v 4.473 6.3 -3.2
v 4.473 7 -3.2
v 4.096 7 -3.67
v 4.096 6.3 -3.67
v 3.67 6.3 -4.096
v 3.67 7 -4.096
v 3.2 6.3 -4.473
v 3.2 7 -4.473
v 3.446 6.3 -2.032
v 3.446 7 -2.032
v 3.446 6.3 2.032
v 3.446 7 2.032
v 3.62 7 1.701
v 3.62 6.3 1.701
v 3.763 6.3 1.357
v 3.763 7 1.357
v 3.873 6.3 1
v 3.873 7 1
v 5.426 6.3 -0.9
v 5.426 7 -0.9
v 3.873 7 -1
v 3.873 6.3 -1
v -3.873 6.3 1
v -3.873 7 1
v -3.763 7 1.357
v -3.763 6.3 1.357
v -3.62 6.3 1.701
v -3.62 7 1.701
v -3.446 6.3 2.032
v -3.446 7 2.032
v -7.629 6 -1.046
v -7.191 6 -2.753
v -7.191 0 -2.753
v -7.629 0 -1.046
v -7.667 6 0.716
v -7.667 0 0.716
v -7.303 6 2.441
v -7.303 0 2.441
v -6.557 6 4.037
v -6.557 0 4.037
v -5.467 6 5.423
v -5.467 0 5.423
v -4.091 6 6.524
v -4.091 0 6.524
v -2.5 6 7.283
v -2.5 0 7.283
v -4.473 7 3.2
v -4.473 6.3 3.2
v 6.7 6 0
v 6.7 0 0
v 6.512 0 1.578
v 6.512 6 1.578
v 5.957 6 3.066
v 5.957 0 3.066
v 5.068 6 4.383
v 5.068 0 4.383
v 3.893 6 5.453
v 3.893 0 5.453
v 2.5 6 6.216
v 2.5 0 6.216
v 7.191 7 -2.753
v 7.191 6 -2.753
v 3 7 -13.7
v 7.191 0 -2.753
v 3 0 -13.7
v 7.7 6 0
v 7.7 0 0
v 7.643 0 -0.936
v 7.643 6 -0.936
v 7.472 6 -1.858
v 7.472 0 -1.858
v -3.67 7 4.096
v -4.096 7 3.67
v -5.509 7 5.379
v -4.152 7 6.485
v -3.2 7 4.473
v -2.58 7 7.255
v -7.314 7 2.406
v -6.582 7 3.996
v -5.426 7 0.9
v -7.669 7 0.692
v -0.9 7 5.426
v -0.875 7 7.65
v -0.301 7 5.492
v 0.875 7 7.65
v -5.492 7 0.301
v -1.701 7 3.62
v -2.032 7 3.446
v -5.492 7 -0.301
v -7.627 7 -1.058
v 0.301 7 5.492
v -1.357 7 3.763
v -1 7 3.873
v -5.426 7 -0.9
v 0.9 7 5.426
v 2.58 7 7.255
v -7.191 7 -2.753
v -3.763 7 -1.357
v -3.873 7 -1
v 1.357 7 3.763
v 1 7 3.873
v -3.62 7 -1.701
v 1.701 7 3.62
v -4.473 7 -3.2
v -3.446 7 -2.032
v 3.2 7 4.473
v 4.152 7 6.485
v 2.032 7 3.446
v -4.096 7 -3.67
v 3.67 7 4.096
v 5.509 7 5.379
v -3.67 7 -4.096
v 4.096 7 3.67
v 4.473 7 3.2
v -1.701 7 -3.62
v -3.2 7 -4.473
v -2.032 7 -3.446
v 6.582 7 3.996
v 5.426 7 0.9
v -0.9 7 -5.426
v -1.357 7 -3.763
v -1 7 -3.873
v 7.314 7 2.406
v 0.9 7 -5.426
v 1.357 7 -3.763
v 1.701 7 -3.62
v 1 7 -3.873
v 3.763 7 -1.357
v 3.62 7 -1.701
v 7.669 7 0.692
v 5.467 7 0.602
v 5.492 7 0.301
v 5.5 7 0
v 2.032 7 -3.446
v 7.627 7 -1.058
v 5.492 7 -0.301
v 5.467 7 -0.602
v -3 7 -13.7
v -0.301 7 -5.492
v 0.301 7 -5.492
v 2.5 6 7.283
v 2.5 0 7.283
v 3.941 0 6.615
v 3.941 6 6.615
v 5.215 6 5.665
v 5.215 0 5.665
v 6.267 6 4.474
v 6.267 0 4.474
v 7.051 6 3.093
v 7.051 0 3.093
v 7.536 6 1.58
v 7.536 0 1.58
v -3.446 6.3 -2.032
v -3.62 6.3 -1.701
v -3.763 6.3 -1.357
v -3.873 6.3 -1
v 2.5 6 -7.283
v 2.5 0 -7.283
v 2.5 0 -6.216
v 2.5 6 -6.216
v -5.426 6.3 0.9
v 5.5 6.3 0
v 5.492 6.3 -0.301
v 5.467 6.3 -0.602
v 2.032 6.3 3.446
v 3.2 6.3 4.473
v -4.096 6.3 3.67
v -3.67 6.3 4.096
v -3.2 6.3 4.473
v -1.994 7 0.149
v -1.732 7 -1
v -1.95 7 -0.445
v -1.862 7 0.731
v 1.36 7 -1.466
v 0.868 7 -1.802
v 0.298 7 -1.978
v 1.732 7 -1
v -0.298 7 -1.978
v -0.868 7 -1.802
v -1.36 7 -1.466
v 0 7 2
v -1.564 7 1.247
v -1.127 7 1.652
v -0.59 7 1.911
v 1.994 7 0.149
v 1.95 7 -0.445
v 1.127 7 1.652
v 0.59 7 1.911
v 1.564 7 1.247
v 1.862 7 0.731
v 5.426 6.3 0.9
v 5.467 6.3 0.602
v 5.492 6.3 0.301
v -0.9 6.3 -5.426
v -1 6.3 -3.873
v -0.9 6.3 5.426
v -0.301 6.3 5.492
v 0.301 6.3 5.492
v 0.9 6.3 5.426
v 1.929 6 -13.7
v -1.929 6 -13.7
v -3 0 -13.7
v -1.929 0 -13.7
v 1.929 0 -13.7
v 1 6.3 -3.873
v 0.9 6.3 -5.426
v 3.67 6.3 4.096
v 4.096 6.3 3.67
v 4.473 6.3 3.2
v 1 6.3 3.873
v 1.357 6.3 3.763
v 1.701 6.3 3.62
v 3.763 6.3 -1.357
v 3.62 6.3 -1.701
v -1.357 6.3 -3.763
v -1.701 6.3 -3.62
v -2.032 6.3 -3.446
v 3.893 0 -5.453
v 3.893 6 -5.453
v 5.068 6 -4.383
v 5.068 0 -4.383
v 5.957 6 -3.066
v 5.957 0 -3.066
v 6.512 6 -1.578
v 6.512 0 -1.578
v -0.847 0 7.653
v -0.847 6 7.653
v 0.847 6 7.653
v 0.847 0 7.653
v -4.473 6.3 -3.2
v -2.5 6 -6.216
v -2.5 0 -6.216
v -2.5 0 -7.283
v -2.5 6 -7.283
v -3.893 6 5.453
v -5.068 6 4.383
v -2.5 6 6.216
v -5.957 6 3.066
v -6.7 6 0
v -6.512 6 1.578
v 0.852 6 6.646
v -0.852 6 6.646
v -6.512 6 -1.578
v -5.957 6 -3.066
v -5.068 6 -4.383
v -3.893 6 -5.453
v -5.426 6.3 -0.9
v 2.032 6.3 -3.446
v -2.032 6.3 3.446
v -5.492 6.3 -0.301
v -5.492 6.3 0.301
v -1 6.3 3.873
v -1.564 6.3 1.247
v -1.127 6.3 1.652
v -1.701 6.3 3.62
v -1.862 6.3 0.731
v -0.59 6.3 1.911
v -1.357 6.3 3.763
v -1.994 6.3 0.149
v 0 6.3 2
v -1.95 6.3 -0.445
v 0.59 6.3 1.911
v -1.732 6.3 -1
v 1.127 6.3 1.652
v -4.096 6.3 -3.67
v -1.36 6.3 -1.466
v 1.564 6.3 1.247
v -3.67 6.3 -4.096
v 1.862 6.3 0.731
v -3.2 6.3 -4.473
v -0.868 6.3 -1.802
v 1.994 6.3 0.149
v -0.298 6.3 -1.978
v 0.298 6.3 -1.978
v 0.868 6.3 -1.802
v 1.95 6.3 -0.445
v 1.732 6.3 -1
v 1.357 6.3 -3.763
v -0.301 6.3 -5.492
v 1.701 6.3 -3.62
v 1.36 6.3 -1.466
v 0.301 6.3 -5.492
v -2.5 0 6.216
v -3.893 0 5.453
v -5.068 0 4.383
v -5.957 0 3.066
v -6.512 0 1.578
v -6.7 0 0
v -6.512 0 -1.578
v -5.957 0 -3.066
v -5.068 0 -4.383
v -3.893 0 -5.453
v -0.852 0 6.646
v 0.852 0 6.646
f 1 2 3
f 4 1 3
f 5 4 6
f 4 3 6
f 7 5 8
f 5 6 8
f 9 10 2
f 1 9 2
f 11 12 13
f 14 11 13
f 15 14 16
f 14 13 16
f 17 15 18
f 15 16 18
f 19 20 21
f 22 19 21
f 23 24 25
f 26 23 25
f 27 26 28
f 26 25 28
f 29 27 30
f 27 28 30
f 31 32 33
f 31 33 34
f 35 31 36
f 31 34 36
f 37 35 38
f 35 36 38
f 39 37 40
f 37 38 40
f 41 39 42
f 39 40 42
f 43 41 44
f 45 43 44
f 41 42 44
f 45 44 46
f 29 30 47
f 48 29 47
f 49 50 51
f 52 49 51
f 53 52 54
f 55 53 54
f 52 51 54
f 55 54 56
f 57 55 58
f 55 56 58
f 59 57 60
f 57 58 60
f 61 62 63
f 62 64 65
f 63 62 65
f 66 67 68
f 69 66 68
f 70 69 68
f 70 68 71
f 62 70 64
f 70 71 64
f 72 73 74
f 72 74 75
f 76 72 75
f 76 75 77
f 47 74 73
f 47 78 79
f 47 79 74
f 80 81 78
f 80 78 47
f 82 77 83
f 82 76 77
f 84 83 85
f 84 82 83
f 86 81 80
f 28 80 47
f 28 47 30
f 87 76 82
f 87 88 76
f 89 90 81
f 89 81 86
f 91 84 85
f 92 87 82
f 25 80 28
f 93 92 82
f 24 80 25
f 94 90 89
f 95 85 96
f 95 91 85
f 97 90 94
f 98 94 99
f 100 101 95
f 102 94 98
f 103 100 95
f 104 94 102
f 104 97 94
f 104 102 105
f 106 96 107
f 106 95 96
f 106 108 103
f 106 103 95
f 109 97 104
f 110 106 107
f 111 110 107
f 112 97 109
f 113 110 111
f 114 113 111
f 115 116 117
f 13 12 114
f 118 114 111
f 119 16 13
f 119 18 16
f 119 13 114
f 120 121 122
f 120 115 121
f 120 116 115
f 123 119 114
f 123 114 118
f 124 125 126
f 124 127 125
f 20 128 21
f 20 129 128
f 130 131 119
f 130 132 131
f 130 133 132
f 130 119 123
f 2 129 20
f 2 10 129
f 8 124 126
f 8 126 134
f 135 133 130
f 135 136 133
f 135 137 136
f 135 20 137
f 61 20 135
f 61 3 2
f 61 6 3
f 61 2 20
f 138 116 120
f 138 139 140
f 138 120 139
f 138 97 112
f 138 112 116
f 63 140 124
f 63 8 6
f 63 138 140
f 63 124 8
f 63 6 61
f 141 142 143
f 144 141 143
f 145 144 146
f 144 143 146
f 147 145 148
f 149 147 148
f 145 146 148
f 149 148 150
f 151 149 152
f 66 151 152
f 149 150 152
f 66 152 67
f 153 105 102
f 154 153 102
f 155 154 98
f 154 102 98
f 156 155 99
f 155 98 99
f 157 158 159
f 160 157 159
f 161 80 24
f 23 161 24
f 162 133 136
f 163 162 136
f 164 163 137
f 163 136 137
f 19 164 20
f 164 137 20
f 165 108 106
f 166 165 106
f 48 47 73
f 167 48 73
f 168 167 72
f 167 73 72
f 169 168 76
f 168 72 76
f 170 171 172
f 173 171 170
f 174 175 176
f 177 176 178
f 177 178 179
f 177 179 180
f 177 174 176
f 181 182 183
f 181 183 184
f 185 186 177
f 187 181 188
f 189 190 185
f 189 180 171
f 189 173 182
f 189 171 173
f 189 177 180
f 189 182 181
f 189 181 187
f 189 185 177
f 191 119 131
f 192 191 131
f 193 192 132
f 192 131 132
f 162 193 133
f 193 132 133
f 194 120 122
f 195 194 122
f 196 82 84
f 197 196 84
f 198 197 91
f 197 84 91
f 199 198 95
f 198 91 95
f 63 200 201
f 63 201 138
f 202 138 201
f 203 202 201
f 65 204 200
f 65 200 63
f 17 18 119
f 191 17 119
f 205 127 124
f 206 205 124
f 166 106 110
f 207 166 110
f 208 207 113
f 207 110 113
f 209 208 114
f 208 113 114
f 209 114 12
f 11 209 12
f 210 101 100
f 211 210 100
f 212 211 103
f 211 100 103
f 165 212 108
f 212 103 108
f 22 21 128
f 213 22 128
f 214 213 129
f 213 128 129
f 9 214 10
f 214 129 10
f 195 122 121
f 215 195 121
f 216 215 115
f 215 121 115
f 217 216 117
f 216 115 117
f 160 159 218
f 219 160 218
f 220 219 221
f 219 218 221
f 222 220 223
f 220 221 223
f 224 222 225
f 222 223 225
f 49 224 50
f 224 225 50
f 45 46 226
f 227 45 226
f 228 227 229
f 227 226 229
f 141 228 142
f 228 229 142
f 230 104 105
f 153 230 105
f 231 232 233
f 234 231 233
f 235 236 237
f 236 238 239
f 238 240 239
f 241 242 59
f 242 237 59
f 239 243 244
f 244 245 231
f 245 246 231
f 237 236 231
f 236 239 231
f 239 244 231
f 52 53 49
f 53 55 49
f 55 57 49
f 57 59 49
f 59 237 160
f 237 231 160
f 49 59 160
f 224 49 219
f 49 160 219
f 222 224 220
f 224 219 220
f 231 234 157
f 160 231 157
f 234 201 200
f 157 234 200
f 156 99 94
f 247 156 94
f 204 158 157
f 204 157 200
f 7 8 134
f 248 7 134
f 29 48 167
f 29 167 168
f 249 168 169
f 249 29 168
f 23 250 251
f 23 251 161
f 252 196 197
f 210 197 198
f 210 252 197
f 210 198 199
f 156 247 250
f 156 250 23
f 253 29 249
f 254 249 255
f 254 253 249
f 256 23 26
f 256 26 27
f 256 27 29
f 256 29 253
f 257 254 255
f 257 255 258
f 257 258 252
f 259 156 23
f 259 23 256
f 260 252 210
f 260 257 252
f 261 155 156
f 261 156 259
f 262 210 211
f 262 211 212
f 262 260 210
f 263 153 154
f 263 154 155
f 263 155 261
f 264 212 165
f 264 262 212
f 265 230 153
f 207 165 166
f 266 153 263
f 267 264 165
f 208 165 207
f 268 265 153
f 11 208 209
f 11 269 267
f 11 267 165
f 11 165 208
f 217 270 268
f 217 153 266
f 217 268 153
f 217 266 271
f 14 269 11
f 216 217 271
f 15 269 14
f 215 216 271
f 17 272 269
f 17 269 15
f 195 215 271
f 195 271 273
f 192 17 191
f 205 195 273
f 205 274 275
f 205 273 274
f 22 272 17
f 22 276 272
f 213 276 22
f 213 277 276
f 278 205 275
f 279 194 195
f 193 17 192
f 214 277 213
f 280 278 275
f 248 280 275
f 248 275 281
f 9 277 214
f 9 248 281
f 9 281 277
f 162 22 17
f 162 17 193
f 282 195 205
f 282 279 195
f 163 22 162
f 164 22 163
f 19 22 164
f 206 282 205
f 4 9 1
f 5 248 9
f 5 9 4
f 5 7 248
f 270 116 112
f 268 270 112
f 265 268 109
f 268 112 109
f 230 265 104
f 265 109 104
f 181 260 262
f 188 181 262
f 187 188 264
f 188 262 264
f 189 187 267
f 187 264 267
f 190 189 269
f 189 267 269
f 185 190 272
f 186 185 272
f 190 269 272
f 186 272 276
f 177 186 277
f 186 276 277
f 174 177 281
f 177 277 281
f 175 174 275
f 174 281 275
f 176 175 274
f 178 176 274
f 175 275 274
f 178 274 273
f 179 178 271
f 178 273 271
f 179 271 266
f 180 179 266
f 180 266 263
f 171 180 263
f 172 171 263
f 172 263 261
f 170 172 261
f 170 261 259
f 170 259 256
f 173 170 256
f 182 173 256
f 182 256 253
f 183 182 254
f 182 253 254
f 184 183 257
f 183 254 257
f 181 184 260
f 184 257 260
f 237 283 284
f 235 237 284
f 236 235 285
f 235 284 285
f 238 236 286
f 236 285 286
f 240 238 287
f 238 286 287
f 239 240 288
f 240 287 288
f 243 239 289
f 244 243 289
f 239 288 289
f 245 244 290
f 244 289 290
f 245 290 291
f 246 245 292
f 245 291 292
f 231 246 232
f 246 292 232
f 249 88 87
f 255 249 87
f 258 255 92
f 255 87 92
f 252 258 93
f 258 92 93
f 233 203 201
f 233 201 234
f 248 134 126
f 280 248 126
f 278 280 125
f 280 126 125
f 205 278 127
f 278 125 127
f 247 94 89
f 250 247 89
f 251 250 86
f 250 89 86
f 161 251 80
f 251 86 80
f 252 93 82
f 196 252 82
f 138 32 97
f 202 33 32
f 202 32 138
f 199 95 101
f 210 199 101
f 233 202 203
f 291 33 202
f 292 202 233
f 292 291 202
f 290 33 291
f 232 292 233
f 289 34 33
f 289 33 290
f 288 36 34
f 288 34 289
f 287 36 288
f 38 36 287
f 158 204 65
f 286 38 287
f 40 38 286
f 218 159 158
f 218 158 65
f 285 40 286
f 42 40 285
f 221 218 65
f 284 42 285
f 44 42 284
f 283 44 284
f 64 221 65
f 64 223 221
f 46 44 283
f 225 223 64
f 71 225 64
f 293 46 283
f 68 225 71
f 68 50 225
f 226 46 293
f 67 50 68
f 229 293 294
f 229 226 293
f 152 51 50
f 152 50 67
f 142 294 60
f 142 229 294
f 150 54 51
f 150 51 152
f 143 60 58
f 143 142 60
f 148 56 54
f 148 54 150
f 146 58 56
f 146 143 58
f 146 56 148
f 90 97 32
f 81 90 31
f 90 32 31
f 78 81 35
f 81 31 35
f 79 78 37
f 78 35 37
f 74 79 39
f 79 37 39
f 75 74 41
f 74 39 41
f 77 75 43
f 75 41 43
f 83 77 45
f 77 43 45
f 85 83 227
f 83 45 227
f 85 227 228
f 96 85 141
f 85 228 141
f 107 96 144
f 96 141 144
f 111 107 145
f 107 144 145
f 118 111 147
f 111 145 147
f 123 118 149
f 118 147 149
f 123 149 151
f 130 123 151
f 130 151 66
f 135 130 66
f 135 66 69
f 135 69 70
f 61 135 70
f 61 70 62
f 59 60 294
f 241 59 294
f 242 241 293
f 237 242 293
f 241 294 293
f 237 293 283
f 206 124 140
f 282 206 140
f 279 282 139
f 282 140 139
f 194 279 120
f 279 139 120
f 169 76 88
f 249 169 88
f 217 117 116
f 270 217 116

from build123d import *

# Parameters (mm, degrees)
BOSS_EXTRUDE1_DEPTH = 6
BOSS_EXTRUDE2_DEPTH = 1
BOSS_EXTRUDE3_START = 6
BOSS_EXTRUDE3_DEPTH = 6
SKETCH4_R           = 4
CUT_EXTRUDE1_DEPTH  = 0.7
SKETCH5_R           = 2
BOSS_EXTRUDE4_DEPTH = 0.7


with BuildPart() as part:
    # Sketch1 → Boss-Extrude1 (new body)
    with BuildSketch(Plane(origin=(0, 0, 0), x_dir=(1, 0, 0), z_dir=(0, 1, 0))):
        with BuildLine():
            ThreePointArc((-2.5, 7.282856582), (-7.7, 0), (-2.5, -7.282856582))
            Line((-2.5, -7.282856582), (-2.5, -6.216108107))
            ThreePointArc((-2.5, -6.216108107), (-6.7, 0), (-2.5, 6.216108107))
            Line((-2.5, 6.216108107), (-2.5, 7.282856582))
        make_face()
        with BuildLine():
            Line((-2.5, -6.216108107), (-2.5, -7.282856582))
            ThreePointArc((-2.5, -7.282856582), (0, -7.7), (2.5, -7.282856582))
            Line((2.5, -7.282856582), (2.5, -6.216108107))
            ThreePointArc((2.5, -6.216108107), (0, -6.7), (-2.5, -6.216108107))
        make_face()
        with BuildLine():
            Line((2.5, -6.216108107), (2.5, -7.282856582))
            ThreePointArc((2.5, -7.282856582), (6.266578014, -4.474371464), (7.7, 0))
            ThreePointArc((7.7, 0), (6.266578014, 4.474371464), (2.5, 7.282856582))
            Line((2.5, 7.282856582), (2.5, 6.216108107))
            ThreePointArc((2.5, 6.216108107), (5.551576353, 3.750999867), (6.7, 0))
            ThreePointArc((6.7, 0), (5.551576353, -3.750999867), (2.5, -6.216108107))
        make_face()
    extrude(amount=BOSS_EXTRUDE1_DEPTH)

    # Sketch2 → Boss-Extrude2 (add)
    with BuildSketch(Plane(origin=(0, 6, 0), x_dir=(1, 0, 0), z_dir=(0, 1, 0))):
        with BuildLine():
            Line((3, 13.7), (-3, 13.7))
            Line((-3, 13.7), (-7.191011254, 2.753063229))
            ThreePointArc((-7.191011254, 2.753063229), (-5.348708418, 5.539071968), (-2.5, 7.282856582))
            ThreePointArc((-2.5, 7.282856582), (0, 7.7), (2.5, 7.282856582))
            ThreePointArc((2.5, 7.282856582), (5.348708418, 5.539071968), (7.191011254, 2.753063229))
            Line((7.191011254, 2.753063229), (3, 13.7))
        make_face()
        with BuildLine():
            ThreePointArc((2.5, 6.216108107), (0, -6.7), (-2.5, 6.216108107))
            Line((-2.5, 6.216108107), (-2.5, 7.282856582))
            ThreePointArc((-2.5, 7.282856582), (0, -7.7), (2.5, 7.282856582))
            Line((2.5, 7.282856582), (2.5, 6.216108107))
        make_face()
        with BuildLine():
            ThreePointArc((-2.5, 7.282856582), (-5.348708418, 5.539071968), (-7.191011254, 2.753063229))
            ThreePointArc((-7.191011254, 2.753063229), (-1.399859519, -7.571683652), (7.7, 0))
            ThreePointArc((7.7, 0), (7.571683652, 1.399859519), (7.191011254, 2.753063229))
            ThreePointArc((7.191011254, 2.753063229), (5.348708418, 5.539071968), (2.5, 7.282856582))
            Line((2.5, 7.282856582), (2.5, 6.216108107))
            ThreePointArc((2.5, 6.216108107), (0, -6.7), (-2.5, 6.216108107))
            Line((-2.5, 6.216108107), (-2.5, 7.282856582))
        make_face()
        with BuildLine():
            ThreePointArc((2.5, 7.282856582), (0, 7.7), (-2.5, 7.282856582))
            Line((-2.5, 7.282856582), (-2.5, 6.216108107))
            ThreePointArc((-2.5, 6.216108107), (0, -6.7), (2.5, 6.216108107))
            Line((2.5, 6.216108107), (2.5, 7.282856582))
        make_face()
    extrude(amount=BOSS_EXTRUDE2_DEPTH)

    # Sketch3 → Boss-Extrude3 (add)
    with BuildSketch(Plane.XZ.offset(-6).offset(BOSS_EXTRUDE3_START)):
        with BuildLine():
            Line((-7.191011254, -2.753063229), (-3, -13.7))
            Line((-3, -13.7), (-1.929218753, -13.7))
            Line((-1.929218753, -13.7), (-2.5, -7.282856582))
            ThreePointArc((-2.5, -7.282856582), (-5.348708418, -5.539071968), (-7.191011254, -2.753063229))
        make_face()
        with BuildLine():
            Line((2.5, -7.282856582), (1.929218753, -13.7))
            Line((1.929218753, -13.7), (3, -13.7))
            Line((3, -13.7), (7.191011254, -2.753063229))
            ThreePointArc((7.191011254, -2.753063229), (5.348708418, -5.539071968), (2.5, -7.282856582))
        make_face()
    extrude(amount=-BOSS_EXTRUDE3_DEPTH)

    # Sketch4 → Cut-Extrude1 (cut)
    with BuildSketch(Plane(origin=(0, 7, 0), x_dir=(1, 0, 0), z_dir=(0, 1, 0))):
        Circle(SKETCH4_R)
        with BuildLine():
            Line((-2.031506006, 3.445719569), (-3.200269116, 4.473061322))
            ThreePointArc((-3.200269116, 4.473061322), (-3.889087297, 3.889087297), (-4.473061322, 3.200269116))
            Line((-4.473061322, 3.200269116), (-3.445719569, 2.031506006))
            ThreePointArc((-3.445719569, 2.031506006), (-2.828427125, 2.828427125), (-2.031506006, 3.445719569))
        make_face()
        with BuildLine():
            Line((-3.872983346, 1), (-5.425863987, 0.9))
            ThreePointArc((-5.425863987, 0.9), (-5.5, 0), (-5.425863987, -0.9))
            Line((-5.425863987, -0.9), (-3.872983346, -1))
            ThreePointArc((-3.872983346, -1), (-4, 0), (-3.872983346, 1))
        make_face()
        with BuildLine():
            Line((-3.445719569, -2.031506006), (-4.473061322, -3.200269116))
            ThreePointArc((-4.473061322, -3.200269116), (-3.889087297, -3.889087297), (-3.200269116, -4.473061322))
            Line((-3.200269116, -4.473061322), (-2.031506006, -3.445719569))
            ThreePointArc((-2.031506006, -3.445719569), (-2.828427125, -2.828427125), (-3.445719569, -2.031506006))
        make_face()
        with BuildLine():
            Line((-1, -3.872983346), (-0.9, -5.425863987))
            ThreePointArc((-0.9, -5.425863987), (0, -5.5), (0.9, -5.425863987))
            Line((0.9, -5.425863987), (1, -3.872983346))
            ThreePointArc((1, -3.872983346), (0, -4), (-1, -3.872983346))
        make_face()
        with BuildLine():
            ThreePointArc((3.200269116, -4.473061322), (3.889087297, -3.889087297), (4.473061322, -3.200269116))
            Line((4.473061322, -3.200269116), (3.445719569, -2.031506006))
            ThreePointArc((3.445719569, -2.031506006), (2.828427125, -2.828427125), (2.031506006, -3.445719569))
            Line((2.031506006, -3.445719569), (3.200269116, -4.473061322))
        make_face()
        with BuildLine():
            ThreePointArc((5.5, 0), (5.481434663, 0.451524127), (5.425863987, 0.9))
            Line((5.425863987, 0.9), (3.872983346, 1))
            ThreePointArc((3.872983346, 1), (3.968118785, 0.50401717), (4, 0))
            ThreePointArc((4, 0), (3.968118785, -0.50401717), (3.872983346, -1))
            Line((3.872983346, -1), (5.425863987, -0.9))
            ThreePointArc((5.425863987, -0.9), (5.481434663, -0.451524127), (5.5, 0))
        make_face()
        with BuildLine():
            ThreePointArc((4.473061322, 3.200269116), (3.889087297, 3.889087297), (3.200269116, 4.473061322))
            Line((3.200269116, 4.473061322), (2.031506006, 3.445719569))
            ThreePointArc((2.031506006, 3.445719569), (2.828427125, 2.828427125), (3.445719569, 2.031506006))
            Line((3.445719569, 2.031506006), (4.473061322, 3.200269116))
        make_face()
        with BuildLine():
            ThreePointArc((0.9, 5.425863987), (0, 5.5), (-0.9, 5.425863987))
            Line((-0.9, 5.425863987), (-1, 3.872983346))
            ThreePointArc((-1, 3.872983346), (0, 4), (1, 3.872983346))
            Line((1, 3.872983346), (0.9, 5.425863987))
        make_face()
    extrude(amount=-CUT_EXTRUDE1_DEPTH, mode=Mode.SUBTRACT)

    # Sketch5 → Boss-Extrude4 (add)
    with BuildSketch(Plane(origin=(0, 6.3, 0), x_dir=(1, 0, 0), z_dir=(0, 1, 0))):
        with Locations(Location((0, 0, 0), (0, 0, 270))):
            Circle(SKETCH5_R)
    extrude(amount=BOSS_EXTRUDE4_DEPTH)


solid = part.part
